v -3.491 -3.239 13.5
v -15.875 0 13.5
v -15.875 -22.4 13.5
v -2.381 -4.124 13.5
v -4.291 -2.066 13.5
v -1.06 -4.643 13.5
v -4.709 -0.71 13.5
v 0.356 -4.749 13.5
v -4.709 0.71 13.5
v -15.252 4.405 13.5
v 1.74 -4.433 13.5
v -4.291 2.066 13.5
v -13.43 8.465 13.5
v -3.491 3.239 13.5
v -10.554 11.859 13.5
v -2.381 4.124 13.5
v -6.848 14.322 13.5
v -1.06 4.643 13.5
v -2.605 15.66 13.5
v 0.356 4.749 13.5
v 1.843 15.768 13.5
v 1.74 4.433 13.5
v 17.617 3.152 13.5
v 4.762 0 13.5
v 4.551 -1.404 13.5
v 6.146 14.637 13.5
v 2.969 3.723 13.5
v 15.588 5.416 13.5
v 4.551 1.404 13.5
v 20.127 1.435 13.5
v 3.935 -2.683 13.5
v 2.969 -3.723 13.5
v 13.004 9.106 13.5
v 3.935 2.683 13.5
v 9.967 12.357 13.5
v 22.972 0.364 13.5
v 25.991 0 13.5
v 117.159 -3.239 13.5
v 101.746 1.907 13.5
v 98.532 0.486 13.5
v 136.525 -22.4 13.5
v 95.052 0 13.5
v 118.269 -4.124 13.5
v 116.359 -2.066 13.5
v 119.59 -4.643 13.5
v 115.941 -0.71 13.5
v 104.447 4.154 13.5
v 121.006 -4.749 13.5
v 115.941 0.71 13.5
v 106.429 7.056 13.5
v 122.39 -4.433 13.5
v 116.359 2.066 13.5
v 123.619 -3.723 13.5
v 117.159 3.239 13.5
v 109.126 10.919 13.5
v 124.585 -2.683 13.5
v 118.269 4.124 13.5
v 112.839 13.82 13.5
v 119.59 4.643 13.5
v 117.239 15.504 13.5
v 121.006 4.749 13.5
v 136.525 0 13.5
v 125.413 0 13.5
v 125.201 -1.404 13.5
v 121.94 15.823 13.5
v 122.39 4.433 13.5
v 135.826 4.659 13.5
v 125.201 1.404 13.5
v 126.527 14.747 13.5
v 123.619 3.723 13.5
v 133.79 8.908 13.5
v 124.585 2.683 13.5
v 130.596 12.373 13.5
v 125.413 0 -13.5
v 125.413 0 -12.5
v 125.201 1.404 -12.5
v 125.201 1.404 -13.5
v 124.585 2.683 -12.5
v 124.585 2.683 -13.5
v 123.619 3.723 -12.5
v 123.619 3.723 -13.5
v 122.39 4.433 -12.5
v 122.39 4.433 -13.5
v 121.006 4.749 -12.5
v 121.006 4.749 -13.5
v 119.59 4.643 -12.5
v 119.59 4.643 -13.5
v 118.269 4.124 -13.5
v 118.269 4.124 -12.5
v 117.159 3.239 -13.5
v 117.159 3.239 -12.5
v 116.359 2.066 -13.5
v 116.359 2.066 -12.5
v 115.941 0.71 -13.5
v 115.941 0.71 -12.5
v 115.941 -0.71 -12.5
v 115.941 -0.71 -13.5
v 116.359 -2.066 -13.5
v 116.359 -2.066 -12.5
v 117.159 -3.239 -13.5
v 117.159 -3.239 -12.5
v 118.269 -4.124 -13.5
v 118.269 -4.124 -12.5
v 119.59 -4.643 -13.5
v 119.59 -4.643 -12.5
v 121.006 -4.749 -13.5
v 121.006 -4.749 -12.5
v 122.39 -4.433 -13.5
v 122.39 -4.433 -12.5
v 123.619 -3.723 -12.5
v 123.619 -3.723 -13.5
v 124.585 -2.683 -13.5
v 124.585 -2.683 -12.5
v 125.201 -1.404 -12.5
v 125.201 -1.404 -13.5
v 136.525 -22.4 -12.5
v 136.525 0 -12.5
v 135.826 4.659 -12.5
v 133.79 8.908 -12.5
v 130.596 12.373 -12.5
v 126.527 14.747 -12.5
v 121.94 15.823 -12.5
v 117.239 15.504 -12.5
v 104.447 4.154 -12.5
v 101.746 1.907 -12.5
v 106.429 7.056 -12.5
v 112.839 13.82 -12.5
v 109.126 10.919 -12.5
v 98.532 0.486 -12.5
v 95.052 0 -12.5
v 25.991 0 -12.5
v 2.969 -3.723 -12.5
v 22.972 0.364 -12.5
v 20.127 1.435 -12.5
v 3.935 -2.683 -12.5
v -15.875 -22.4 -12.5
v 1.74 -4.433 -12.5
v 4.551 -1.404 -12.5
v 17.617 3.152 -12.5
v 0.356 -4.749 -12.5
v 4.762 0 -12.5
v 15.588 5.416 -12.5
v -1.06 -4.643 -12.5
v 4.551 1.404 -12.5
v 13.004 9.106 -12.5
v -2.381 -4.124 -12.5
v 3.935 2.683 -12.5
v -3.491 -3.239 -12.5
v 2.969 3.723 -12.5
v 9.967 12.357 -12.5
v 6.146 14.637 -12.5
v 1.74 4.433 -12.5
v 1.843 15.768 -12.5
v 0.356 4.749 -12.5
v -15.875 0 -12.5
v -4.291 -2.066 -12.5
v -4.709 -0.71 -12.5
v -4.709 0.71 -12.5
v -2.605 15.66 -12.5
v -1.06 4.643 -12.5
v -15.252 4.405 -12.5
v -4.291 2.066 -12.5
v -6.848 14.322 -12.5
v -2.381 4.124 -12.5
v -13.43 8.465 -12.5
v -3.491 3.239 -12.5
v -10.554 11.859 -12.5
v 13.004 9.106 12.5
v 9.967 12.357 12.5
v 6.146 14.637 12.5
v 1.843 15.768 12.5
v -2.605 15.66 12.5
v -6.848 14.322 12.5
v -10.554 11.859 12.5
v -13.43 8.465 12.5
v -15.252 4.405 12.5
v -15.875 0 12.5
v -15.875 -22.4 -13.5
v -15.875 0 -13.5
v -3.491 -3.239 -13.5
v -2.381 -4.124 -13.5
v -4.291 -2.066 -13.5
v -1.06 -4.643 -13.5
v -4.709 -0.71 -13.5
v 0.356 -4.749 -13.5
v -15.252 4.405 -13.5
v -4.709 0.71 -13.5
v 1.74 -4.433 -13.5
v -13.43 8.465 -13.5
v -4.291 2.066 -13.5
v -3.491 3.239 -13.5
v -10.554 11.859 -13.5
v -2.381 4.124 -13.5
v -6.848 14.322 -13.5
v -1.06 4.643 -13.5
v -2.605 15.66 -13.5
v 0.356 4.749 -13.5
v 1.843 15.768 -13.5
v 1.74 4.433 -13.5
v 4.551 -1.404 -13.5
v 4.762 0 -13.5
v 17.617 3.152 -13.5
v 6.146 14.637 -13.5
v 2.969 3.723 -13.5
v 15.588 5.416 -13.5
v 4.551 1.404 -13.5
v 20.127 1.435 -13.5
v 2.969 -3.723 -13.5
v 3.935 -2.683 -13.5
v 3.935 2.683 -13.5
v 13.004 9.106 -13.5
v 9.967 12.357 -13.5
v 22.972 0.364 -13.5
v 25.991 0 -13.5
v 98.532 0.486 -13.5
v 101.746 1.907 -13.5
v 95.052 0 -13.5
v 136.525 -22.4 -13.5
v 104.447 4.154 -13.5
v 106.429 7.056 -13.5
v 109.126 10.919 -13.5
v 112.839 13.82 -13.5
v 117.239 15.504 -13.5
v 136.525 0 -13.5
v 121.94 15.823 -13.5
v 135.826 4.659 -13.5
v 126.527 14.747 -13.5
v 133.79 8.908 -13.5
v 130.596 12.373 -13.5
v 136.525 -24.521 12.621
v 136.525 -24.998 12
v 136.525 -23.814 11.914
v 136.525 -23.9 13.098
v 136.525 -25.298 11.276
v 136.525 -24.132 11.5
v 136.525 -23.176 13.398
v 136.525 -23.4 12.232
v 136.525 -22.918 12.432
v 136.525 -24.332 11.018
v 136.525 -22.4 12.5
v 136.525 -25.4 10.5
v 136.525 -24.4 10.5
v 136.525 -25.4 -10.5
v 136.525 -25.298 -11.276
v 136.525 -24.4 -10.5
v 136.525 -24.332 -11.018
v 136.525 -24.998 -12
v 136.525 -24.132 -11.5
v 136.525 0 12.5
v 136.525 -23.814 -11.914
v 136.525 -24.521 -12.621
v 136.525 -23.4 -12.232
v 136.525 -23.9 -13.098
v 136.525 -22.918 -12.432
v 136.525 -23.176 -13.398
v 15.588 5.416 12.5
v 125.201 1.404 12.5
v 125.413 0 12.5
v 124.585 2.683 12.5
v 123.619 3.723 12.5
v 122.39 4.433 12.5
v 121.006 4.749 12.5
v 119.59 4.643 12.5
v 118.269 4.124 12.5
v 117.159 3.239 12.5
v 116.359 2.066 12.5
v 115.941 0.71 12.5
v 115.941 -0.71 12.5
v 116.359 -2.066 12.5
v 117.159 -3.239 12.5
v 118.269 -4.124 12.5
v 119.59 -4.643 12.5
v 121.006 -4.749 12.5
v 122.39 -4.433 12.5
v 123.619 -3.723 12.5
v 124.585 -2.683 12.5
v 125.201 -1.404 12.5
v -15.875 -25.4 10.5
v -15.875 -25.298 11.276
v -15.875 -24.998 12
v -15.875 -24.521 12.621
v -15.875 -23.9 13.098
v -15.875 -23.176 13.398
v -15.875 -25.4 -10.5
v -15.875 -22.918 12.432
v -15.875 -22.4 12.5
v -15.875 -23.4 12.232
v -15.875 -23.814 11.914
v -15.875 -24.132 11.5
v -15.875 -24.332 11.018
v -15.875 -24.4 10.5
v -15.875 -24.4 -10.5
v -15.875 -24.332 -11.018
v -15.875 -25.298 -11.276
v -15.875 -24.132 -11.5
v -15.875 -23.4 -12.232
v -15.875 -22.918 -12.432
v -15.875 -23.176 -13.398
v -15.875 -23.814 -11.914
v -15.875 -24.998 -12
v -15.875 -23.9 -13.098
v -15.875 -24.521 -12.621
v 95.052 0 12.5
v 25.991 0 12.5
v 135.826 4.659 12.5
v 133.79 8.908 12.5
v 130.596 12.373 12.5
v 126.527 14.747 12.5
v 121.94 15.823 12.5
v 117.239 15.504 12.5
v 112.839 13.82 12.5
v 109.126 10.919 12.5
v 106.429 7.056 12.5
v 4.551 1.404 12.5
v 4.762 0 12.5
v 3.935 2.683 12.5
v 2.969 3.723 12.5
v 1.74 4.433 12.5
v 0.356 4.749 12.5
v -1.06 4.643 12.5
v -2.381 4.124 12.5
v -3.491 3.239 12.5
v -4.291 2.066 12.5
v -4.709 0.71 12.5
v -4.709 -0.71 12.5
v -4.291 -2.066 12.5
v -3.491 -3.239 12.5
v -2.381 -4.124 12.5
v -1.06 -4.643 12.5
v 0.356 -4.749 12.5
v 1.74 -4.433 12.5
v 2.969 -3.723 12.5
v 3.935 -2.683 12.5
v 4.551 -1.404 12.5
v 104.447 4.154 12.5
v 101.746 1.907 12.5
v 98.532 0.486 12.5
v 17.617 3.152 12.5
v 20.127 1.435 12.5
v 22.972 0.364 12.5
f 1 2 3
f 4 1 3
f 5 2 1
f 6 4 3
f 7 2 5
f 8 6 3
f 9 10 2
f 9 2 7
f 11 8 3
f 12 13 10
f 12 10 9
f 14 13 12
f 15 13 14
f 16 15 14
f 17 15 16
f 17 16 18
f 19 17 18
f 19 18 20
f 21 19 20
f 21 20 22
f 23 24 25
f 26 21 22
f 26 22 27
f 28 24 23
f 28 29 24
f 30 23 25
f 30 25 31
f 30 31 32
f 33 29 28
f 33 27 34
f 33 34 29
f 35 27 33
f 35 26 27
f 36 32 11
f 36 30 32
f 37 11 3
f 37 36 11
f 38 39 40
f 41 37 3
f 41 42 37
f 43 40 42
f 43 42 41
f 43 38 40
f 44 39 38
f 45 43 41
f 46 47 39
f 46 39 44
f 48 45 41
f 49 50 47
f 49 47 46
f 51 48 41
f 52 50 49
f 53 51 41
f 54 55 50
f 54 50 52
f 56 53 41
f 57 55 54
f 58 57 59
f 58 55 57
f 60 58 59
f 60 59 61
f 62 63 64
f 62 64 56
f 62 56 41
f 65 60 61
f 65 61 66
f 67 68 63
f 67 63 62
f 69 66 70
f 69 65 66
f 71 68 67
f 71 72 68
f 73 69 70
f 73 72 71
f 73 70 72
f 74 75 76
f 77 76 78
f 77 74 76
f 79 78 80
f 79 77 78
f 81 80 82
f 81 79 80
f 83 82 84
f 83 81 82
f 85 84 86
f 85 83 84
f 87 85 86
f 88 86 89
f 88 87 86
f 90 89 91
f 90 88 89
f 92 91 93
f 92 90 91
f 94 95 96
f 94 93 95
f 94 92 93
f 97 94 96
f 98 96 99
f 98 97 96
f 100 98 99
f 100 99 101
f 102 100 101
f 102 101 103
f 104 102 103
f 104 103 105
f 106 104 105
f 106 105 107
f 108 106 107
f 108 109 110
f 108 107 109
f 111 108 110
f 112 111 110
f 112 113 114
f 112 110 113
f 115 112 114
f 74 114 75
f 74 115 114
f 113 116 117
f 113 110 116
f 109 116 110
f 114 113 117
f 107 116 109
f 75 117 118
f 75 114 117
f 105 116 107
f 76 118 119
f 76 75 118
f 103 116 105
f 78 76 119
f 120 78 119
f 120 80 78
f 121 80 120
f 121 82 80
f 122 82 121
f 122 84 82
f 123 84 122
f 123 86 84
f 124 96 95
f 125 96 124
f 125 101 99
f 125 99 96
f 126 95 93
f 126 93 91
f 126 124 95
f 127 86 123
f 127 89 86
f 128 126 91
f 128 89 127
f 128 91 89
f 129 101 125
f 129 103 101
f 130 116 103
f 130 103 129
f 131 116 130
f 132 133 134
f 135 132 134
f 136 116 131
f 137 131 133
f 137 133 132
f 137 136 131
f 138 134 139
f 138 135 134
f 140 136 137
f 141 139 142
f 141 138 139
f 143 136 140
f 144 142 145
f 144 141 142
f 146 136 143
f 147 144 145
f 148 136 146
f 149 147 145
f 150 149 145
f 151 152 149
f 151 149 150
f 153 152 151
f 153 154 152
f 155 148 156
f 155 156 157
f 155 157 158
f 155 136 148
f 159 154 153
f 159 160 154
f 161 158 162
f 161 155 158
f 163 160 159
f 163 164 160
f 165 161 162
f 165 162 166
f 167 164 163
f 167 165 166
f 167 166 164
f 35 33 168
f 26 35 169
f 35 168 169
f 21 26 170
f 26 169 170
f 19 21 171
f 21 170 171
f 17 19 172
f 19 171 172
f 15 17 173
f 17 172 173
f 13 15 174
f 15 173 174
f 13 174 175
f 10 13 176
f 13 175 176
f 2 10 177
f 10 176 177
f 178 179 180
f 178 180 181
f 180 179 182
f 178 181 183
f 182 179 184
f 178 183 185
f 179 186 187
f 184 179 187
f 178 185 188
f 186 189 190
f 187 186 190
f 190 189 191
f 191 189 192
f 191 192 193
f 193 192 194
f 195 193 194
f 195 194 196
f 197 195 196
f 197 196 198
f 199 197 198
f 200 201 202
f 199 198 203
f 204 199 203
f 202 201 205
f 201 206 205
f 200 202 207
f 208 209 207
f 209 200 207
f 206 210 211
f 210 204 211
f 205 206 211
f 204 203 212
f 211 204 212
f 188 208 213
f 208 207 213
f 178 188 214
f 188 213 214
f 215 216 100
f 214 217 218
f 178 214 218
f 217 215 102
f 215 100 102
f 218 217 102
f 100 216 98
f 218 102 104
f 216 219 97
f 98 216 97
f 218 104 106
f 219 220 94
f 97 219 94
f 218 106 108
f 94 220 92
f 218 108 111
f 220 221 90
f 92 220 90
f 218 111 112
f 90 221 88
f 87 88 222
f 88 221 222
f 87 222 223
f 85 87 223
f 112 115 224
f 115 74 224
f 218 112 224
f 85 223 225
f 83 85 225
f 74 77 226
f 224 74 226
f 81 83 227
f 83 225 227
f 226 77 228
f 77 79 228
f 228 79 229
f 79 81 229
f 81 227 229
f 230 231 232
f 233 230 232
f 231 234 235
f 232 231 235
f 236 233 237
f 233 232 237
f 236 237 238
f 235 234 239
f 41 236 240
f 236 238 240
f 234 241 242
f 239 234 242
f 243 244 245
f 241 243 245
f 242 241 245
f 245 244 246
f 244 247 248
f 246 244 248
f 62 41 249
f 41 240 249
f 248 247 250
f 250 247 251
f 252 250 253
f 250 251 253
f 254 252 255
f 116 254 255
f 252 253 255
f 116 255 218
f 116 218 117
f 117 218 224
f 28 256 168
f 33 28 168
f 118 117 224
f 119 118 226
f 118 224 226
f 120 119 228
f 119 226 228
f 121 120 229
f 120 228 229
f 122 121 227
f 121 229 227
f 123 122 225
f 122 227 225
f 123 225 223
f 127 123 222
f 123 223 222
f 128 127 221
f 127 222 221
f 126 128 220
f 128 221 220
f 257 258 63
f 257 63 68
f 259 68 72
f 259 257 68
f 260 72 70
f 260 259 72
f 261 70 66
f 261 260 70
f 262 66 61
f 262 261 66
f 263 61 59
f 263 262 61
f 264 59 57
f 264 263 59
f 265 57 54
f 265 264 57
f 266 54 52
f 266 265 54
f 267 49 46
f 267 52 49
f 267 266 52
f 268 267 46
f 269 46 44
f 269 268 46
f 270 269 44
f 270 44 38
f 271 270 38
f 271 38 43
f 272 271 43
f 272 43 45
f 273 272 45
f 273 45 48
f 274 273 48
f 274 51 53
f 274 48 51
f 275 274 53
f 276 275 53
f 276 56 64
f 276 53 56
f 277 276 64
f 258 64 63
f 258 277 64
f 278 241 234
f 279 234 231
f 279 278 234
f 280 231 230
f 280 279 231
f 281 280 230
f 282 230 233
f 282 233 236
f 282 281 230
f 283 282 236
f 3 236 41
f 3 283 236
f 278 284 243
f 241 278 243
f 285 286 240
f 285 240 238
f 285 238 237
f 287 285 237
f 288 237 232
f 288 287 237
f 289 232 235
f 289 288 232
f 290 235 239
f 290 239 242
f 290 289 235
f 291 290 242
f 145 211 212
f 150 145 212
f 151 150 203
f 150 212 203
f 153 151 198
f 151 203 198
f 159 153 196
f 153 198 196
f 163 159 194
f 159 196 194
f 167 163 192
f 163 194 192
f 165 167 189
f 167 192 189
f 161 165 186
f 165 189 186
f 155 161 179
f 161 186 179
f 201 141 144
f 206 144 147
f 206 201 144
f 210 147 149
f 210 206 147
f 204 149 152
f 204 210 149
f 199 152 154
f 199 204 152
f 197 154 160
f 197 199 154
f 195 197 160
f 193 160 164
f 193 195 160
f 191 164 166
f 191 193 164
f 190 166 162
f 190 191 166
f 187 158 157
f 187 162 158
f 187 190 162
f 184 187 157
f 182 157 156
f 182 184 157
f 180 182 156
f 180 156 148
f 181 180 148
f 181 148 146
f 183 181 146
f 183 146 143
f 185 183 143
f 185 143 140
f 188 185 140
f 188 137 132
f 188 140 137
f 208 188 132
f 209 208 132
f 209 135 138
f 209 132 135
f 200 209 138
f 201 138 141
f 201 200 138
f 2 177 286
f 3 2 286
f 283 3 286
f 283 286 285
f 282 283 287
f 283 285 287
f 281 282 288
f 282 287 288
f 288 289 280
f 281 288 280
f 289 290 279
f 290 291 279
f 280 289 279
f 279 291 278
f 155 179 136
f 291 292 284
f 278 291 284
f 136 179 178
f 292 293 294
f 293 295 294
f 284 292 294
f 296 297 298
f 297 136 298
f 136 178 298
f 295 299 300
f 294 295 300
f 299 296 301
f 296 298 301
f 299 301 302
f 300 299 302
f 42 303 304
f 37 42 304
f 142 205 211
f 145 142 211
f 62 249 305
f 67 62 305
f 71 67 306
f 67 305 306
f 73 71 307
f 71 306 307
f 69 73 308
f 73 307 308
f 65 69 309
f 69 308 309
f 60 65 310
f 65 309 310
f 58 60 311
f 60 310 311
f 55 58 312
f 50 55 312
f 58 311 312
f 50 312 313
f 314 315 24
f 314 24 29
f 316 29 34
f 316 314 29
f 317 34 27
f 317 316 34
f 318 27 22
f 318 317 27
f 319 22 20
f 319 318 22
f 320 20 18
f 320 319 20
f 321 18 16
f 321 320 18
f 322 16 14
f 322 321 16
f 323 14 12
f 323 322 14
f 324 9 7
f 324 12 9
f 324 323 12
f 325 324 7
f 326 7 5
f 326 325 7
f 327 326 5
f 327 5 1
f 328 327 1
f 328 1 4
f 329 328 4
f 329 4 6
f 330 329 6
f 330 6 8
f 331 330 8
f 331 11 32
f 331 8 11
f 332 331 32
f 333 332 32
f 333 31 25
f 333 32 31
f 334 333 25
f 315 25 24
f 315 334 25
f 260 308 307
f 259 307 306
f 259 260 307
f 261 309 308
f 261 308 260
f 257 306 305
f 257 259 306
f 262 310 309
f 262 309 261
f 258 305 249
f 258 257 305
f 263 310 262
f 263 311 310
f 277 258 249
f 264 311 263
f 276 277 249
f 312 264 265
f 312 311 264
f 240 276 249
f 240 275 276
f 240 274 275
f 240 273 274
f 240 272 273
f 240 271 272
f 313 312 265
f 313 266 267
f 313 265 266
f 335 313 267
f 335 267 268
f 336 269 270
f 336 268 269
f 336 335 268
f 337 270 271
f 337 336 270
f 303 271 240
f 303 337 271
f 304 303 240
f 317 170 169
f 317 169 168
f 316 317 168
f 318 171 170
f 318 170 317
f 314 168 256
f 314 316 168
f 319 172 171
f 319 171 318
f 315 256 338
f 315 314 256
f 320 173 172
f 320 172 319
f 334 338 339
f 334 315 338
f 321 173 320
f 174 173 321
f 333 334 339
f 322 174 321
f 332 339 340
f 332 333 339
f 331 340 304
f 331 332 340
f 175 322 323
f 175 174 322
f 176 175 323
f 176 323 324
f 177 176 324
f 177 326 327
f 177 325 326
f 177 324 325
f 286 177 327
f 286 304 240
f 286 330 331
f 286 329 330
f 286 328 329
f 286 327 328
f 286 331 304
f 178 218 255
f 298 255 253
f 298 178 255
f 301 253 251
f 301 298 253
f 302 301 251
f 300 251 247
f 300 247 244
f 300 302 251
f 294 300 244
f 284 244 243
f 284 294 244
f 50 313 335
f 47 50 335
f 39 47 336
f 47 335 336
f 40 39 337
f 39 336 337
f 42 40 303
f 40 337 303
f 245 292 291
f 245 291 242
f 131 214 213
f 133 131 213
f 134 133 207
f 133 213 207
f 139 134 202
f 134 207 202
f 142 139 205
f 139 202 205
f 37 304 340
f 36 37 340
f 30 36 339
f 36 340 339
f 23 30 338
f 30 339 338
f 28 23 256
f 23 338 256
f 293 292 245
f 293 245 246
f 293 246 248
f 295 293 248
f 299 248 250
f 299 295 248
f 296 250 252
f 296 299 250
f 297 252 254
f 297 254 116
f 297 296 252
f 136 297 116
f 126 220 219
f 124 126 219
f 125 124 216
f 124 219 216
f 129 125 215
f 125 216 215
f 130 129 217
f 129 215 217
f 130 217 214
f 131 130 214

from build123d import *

# Parameters (mm, degrees)
BASE_EXTRUDE_DEPTH         = 13.5
FILLET1_R                  = 12.7
SHELL1_T                   = -1
SKETCH2_R                  = 4.7625
CUT_EXTRUDE1_DEPTH         = 142.468143499
FLATTEN_BENDS1_START       = -24.4
FLATTEN_BENDS1_OUTLINE_W   = 152.4
FLATTEN_BENDS1_OUTLINE_H   = 1
FLATTEN_BENDS1_DEPTH       = 41.4
FLATTEN_BENDS1_START_2     = -25.4
FLATTEN_BENDS1_2_OUTLINE_R = 4.7625
FLATTEN_BENDS1_2_DEPTH     = 1
PROCESS_BENDS1_START       = -54
PROCESS_BENDS1_OUTLINE_W   = 152.4
PROCESS_BENDS1_OUTLINE_H   = 1
PROCESS_BENDS1_DEPTH       = 40.80822
PROCESS_BENDS1_START_2     = 13.19178
PROCESS_BENDS1_2_OUTLINE_W = 152.4
PROCESS_BENDS1_2_OUTLINE_H = 1
PROCESS_BENDS1_2_DEPTH     = 40.80822
PROCESS_BENDS1_START_3     = -13.5
PROCESS_BENDS1_3_OUTLINE_R = 4.7625
PROCESS_BENDS1_3_DEPTH     = 3
PROCESS_BENDS1_START_4     = 10.5
PROCESS_BENDS1_4_OUTLINE_R = 4.7625
PROCESS_BENDS1_4_DEPTH     = 3
PROCESS_BENDS1_START_5     = -15.875
PROCESS_BENDS1_5_DEPTH     = 152.4


with BuildPart() as part:
    # Sketch1 → Base-Extrude (new, symmetric)
    with BuildSketch(Plane.XY):
        with BuildLine():
            Line((-15.875, 0), (-15.875, -25.4))
            Line((-15.875, -25.4), (136.525, -25.4))
            Line((136.525, -25.4), (136.525, 0))
            ThreePointArc((136.525, 0), (123.40666482, 15.633823079), (105.732379645, 5.429569775))
            Line((105.732379645, 5.429569775), (103.756177862, 0))
            Line((103.756177862, 0), (19.379796597, 0))
            Line((19.379796597, 0), (13.004038703, 9.105525927))
            ThreePointArc((13.004038703, 9.105525927), (-4.773704567, 15.140256593), (-15.875, 0))
        make_face()
    extrude(amount=BASE_EXTRUDE_DEPTH, both=True)

    # Fillet1
    # the kernel refuses this fillet: 12.7 mm, written as the material it adds along each edge
    with BuildSketch(Plane(origin=(103.756177862, 0, -13.5), x_dir=(-1, 0, 0), z_dir=(0, 0, 1))) as fillet1_piece_1:
        with BuildLine():
            CenterArc((8.703846213, -12.7), FILLET1_R, 90, 63.612200039)
            Line((-2.672895276, -7.055555556), (-3.810569425, -6.491111111))
            ThreePointArc((-3.810569425, -6.491111111), (-3.169611411, -4.995204193), (-1.193409628, 0.434365582))
            Line((-1.193409628, 0.434365582), (0, 1.27))
            Line((0, 1.27), (8.703846213, 1.27))
            Line((8.703846213, 1.27), (8.703846213, 0))
        make_face()
    extrude(amount=27)
    with BuildSketch(Plane(origin=(19.379796597, 0, 13.5), x_dir=(-0.5735764363510504, 0.8191520442889888, 0), z_dir=(0, 0, -1))) as fillet1_piece_2:
        with BuildLine():
            CenterArc((FILLET1_R * 0.520567050552, FILLET1_R), FILLET1_R, 215, 55)
            Line((-FILLET1_R * 0.298584993737, FILLET1_R * 0.426423563649), (0, 0))
            Line((0, 0), (FILLET1_R * 0.520567050552, 0))
        make_face()
    extrude(amount=27)

    # Shell1
    shell1_openings = [part.faces().sort_by_distance(p)[0] for p in [
        (-15.875, -12.7, 0),
        (136.525, -12.7, 0),
        (124.273424559, 15.45595094, 0),
        (60.521664894, 0, 0),
        (14.29590294, 7.260552593, 0),
        (-4.773704567, 15.140256593, 0),
        (20.126790751, 1.434962419, 0),
        (101.745819363, 1.907075363, 0),
    ]]
    offset(amount=SHELL1_T, openings=shell1_openings, kind=Kind.INTERSECTION)

    # Sketch2 → Cut-Extrude1 (cut, through all)
    with BuildSketch(Plane.XY.offset(13.5)):
        with Locations((120.65, 0)):
            Circle(SKETCH2_R)
        Circle(SKETCH2_R)
    extrude(amount=-CUT_EXTRUDE1_DEPTH, mode=Mode.SUBTRACT)

    # Flatten-Bends1: read off the stored shape, not the designer's step
    # Flatten-Bends1 outline → Flatten-Bends1 (cut)
    with BuildSketch(Plane(origin=(0, 0, 0), x_dir=(1, 0, 0), z_dir=(0, 1, 0)).offset(FLATTEN_BENDS1_START)):
        with Locations((60.325, 13)):
            Rectangle(FLATTEN_BENDS1_OUTLINE_W, FLATTEN_BENDS1_OUTLINE_H)
        with Locations((60.325, -13)):
            Rectangle(FLATTEN_BENDS1_OUTLINE_W, FLATTEN_BENDS1_OUTLINE_H)
    extrude(amount=FLATTEN_BENDS1_DEPTH, mode=Mode.SUBTRACT)

    # Flatten-Bends1 2 outline → Flatten-Bends1 2 (add)
    # profile 1 of 2: a face of its own
    with BuildSketch(Plane(origin=(0, 0, 0), x_dir=(1, 0, 0), z_dir=(0, 1, 0)).offset(FLATTEN_BENDS1_START_2)):
        with BuildLine():
            ThreePointArc((106.429073138, -43.882546373), (124.273424559, -52.282941757), (136.525, -36.826990817))
            Line((136.525, -36.826990817), (136.525, -13.5))
            Line((136.525, -13.5), (-15.875, -13.5))
            Line((-15.875, -13.5), (-15.875, -36.826990817))
            ThreePointArc((-15.875, -36.826990817), (-4.773704567, -51.96724741), (13.004038703, -45.932516744))
            Line((13.004038703, -45.932516744), (15.587767176, -42.242570075))
            ThreePointArc((15.587767176, -42.242570075), (20.126790751, -38.261953236), (25.990998139, -36.826990817))
            Line((25.990998139, -36.826990817), (95.052331649, -36.826990817))
            ThreePointArc((95.052331649, -36.826990817), (101.745819363, -38.73406618), (106.429073138, -43.882546373))
        make_face()
        with Locations((0, -36.826990817)):
            Circle(FLATTEN_BENDS1_2_OUTLINE_R, mode=Mode.SUBTRACT)
        with Locations((120.65, -36.826990817)):
            Circle(FLATTEN_BENDS1_2_OUTLINE_R, mode=Mode.SUBTRACT)
    # profile 2 of 2: a face of its own
    with BuildSketch(Plane(origin=(0, 0, 0), x_dir=(1, 0, 0), z_dir=(0, 1, 0)).offset(FLATTEN_BENDS1_START_2)):
        with BuildLine():
            Line((-15.875, 36.826990817), (-15.875, 13.5))
            Line((-15.875, 13.5), (136.525, 13.5))
            Line((136.525, 13.5), (136.525, 36.826990817))
            ThreePointArc((136.525, 36.826990817), (124.273424559, 52.282941757), (106.429073138, 43.882546373))
            ThreePointArc((106.429073138, 43.882546373), (101.745819363, 38.73406618), (95.052331649, 36.826990817))
            Line((95.052331649, 36.826990817), (25.990998139, 36.826990817))
            ThreePointArc((25.990998139, 36.826990817), (20.126790751, 38.261953236), (15.587767176, 42.242570075))
            Line((15.587767176, 42.242570075), (13.004038703, 45.932516744))
            ThreePointArc((13.004038703, 45.932516744), (-4.773704567, 51.96724741), (-15.875, 36.826990817))
        make_face()
        with Locations((0, 36.826990817)):
            Circle(FLATTEN_BENDS1_2_OUTLINE_R, mode=Mode.SUBTRACT)
        with Locations((120.65, 36.826990817)):
            Circle(FLATTEN_BENDS1_2_OUTLINE_R, mode=Mode.SUBTRACT)
    extrude(amount=FLATTEN_BENDS1_2_DEPTH)

    # Process-Bends1: read off the stored shape, not the designer's step
    # Process-Bends1 outline → Process-Bends1 (cut)
    with BuildSketch(Plane.XY.offset(PROCESS_BENDS1_START)):
        with Locations((60.325, -24.9)):
            Rectangle(PROCESS_BENDS1_OUTLINE_W, PROCESS_BENDS1_OUTLINE_H)
    extrude(amount=PROCESS_BENDS1_DEPTH, mode=Mode.SUBTRACT)

    # Process-Bends1 2 outline → Process-Bends1 2 (cut)
    with BuildSketch(Plane.XY.offset(PROCESS_BENDS1_START_2)):
        with Locations((60.325, -24.9)):
            Rectangle(PROCESS_BENDS1_2_OUTLINE_W, PROCESS_BENDS1_2_OUTLINE_H)
    extrude(amount=PROCESS_BENDS1_2_DEPTH, mode=Mode.SUBTRACT)

    # Process-Bends1 3 outline → Process-Bends1 3 (add)
    with BuildSketch(Plane.XY.offset(PROCESS_BENDS1_START_3)):
        with BuildLine():
            Line((136.525, -24.4), (136.525, 0))
            ThreePointArc((136.525, 0), (124.273424559, 15.45595094), (106.429073138, 7.055555556))
            ThreePointArc((106.429073138, 7.055555556), (101.745819363, 1.907075363), (95.052331649, 0))
            Line((95.052331649, 0), (25.990998139, 0))
            ThreePointArc((25.990998139, 0), (20.126790751, 1.434962419), (15.587767176, 5.415579258))
            Line((15.587767176, 5.415579258), (13.004038703, 9.105525927))
            ThreePointArc((13.004038703, 9.105525927), (-4.773704567, 15.140256593), (-15.875, 0))
            Line((-15.875, 0), (-15.875, -24.4))
            Line((-15.875, -24.4), (136.525, -24.4))
        make_face()
        Circle(PROCESS_BENDS1_3_OUTLINE_R, mode=Mode.SUBTRACT)
        with Locations((120.65, 0)):
            Circle(PROCESS_BENDS1_3_OUTLINE_R, mode=Mode.SUBTRACT)
    extrude(amount=PROCESS_BENDS1_3_DEPTH)

    # Process-Bends1 4 outline → Process-Bends1 4 (add)
    with BuildSketch(Plane.XY.offset(PROCESS_BENDS1_START_4)):
        with BuildLine():
            Line((136.525, -24.4), (136.525, 0))
            ThreePointArc((136.525, 0), (124.273424559, 15.45595094), (106.429073138, 7.055555556))
            ThreePointArc((106.429073138, 7.055555556), (101.745819363, 1.907075363), (95.052331649, 0))
            Line((95.052331649, 0), (25.990998139, 0))
            ThreePointArc((25.990998139, 0), (20.126790751, 1.434962419), (15.587767176, 5.415579258))
            Line((15.587767176, 5.415579258), (13.004038703, 9.105525927))
            ThreePointArc((13.004038703, 9.105525927), (-4.773704567, 15.140256593), (-15.875, 0))
            Line((-15.875, 0), (-15.875, -24.4))
            Line((-15.875, -24.4), (136.525, -24.4))
        make_face()
        Circle(PROCESS_BENDS1_4_OUTLINE_R, mode=Mode.SUBTRACT)
        with Locations((120.65, 0)):
            Circle(PROCESS_BENDS1_4_OUTLINE_R, mode=Mode.SUBTRACT)
    extrude(amount=PROCESS_BENDS1_4_DEPTH)

    # Process-Bends1 5 outline → Process-Bends1 5 (cut)
    with BuildSketch(Plane.YZ.offset(PROCESS_BENDS1_START_5)):
        with BuildLine():
            ThreePointArc((-24.4, -10.5), (-23.814213562, -11.914213562), (-22.4, -12.5))
            Line((-22.4, -12.5), (17, -12.5))
            Line((17, -12.5), (17, -10.5))
            Line((17, -10.5), (-24.4, -10.5))
        make_face()
        with BuildLine():
            Line((0, -15), (0, -13.5))
            Line((0, -13.5), (-22.4, -13.5))
            ThreePointArc((-22.4, -13.5), (-24.521320344, -12.621320344), (-25.4, -10.5))
            Line((-25.4, -10.5), (-25.4, -13.19178))
            Line((-25.4, -13.19178), (-24.4, -13.19178))
            Line((-24.4, -13.19178), (-24.4, -15))
            Line((-24.4, -15), (0, -15))
        make_face()
        with BuildLine():
            ThreePointArc((-22.4, 12.5), (-23.814213562, 11.914213562), (-24.4, 10.5))
            Line((-24.4, 10.5), (17, 10.5))
            Line((17, 10.5), (17, 12.5))
            Line((17, 12.5), (-22.4, 12.5))
        make_face()
        with BuildLine():
            Line((-22.4, 13.5), (0, 13.499999989))
            Line((0, 13.499999989), (0, 15))
            Line((0, 15), (-24.4, 15))
            Line((-24.4, 15), (-24.4, 13.19178))
            Line((-24.4, 13.19178), (-25.4, 13.19178))
            Line((-25.4, 13.19178), (-25.4, 10.5))
            ThreePointArc((-25.4, 10.5), (-24.521320344, 12.621320344), (-22.4, 13.5))
        make_face()
    extrude(amount=PROCESS_BENDS1_5_DEPTH, mode=Mode.SUBTRACT)


solid = part.part
